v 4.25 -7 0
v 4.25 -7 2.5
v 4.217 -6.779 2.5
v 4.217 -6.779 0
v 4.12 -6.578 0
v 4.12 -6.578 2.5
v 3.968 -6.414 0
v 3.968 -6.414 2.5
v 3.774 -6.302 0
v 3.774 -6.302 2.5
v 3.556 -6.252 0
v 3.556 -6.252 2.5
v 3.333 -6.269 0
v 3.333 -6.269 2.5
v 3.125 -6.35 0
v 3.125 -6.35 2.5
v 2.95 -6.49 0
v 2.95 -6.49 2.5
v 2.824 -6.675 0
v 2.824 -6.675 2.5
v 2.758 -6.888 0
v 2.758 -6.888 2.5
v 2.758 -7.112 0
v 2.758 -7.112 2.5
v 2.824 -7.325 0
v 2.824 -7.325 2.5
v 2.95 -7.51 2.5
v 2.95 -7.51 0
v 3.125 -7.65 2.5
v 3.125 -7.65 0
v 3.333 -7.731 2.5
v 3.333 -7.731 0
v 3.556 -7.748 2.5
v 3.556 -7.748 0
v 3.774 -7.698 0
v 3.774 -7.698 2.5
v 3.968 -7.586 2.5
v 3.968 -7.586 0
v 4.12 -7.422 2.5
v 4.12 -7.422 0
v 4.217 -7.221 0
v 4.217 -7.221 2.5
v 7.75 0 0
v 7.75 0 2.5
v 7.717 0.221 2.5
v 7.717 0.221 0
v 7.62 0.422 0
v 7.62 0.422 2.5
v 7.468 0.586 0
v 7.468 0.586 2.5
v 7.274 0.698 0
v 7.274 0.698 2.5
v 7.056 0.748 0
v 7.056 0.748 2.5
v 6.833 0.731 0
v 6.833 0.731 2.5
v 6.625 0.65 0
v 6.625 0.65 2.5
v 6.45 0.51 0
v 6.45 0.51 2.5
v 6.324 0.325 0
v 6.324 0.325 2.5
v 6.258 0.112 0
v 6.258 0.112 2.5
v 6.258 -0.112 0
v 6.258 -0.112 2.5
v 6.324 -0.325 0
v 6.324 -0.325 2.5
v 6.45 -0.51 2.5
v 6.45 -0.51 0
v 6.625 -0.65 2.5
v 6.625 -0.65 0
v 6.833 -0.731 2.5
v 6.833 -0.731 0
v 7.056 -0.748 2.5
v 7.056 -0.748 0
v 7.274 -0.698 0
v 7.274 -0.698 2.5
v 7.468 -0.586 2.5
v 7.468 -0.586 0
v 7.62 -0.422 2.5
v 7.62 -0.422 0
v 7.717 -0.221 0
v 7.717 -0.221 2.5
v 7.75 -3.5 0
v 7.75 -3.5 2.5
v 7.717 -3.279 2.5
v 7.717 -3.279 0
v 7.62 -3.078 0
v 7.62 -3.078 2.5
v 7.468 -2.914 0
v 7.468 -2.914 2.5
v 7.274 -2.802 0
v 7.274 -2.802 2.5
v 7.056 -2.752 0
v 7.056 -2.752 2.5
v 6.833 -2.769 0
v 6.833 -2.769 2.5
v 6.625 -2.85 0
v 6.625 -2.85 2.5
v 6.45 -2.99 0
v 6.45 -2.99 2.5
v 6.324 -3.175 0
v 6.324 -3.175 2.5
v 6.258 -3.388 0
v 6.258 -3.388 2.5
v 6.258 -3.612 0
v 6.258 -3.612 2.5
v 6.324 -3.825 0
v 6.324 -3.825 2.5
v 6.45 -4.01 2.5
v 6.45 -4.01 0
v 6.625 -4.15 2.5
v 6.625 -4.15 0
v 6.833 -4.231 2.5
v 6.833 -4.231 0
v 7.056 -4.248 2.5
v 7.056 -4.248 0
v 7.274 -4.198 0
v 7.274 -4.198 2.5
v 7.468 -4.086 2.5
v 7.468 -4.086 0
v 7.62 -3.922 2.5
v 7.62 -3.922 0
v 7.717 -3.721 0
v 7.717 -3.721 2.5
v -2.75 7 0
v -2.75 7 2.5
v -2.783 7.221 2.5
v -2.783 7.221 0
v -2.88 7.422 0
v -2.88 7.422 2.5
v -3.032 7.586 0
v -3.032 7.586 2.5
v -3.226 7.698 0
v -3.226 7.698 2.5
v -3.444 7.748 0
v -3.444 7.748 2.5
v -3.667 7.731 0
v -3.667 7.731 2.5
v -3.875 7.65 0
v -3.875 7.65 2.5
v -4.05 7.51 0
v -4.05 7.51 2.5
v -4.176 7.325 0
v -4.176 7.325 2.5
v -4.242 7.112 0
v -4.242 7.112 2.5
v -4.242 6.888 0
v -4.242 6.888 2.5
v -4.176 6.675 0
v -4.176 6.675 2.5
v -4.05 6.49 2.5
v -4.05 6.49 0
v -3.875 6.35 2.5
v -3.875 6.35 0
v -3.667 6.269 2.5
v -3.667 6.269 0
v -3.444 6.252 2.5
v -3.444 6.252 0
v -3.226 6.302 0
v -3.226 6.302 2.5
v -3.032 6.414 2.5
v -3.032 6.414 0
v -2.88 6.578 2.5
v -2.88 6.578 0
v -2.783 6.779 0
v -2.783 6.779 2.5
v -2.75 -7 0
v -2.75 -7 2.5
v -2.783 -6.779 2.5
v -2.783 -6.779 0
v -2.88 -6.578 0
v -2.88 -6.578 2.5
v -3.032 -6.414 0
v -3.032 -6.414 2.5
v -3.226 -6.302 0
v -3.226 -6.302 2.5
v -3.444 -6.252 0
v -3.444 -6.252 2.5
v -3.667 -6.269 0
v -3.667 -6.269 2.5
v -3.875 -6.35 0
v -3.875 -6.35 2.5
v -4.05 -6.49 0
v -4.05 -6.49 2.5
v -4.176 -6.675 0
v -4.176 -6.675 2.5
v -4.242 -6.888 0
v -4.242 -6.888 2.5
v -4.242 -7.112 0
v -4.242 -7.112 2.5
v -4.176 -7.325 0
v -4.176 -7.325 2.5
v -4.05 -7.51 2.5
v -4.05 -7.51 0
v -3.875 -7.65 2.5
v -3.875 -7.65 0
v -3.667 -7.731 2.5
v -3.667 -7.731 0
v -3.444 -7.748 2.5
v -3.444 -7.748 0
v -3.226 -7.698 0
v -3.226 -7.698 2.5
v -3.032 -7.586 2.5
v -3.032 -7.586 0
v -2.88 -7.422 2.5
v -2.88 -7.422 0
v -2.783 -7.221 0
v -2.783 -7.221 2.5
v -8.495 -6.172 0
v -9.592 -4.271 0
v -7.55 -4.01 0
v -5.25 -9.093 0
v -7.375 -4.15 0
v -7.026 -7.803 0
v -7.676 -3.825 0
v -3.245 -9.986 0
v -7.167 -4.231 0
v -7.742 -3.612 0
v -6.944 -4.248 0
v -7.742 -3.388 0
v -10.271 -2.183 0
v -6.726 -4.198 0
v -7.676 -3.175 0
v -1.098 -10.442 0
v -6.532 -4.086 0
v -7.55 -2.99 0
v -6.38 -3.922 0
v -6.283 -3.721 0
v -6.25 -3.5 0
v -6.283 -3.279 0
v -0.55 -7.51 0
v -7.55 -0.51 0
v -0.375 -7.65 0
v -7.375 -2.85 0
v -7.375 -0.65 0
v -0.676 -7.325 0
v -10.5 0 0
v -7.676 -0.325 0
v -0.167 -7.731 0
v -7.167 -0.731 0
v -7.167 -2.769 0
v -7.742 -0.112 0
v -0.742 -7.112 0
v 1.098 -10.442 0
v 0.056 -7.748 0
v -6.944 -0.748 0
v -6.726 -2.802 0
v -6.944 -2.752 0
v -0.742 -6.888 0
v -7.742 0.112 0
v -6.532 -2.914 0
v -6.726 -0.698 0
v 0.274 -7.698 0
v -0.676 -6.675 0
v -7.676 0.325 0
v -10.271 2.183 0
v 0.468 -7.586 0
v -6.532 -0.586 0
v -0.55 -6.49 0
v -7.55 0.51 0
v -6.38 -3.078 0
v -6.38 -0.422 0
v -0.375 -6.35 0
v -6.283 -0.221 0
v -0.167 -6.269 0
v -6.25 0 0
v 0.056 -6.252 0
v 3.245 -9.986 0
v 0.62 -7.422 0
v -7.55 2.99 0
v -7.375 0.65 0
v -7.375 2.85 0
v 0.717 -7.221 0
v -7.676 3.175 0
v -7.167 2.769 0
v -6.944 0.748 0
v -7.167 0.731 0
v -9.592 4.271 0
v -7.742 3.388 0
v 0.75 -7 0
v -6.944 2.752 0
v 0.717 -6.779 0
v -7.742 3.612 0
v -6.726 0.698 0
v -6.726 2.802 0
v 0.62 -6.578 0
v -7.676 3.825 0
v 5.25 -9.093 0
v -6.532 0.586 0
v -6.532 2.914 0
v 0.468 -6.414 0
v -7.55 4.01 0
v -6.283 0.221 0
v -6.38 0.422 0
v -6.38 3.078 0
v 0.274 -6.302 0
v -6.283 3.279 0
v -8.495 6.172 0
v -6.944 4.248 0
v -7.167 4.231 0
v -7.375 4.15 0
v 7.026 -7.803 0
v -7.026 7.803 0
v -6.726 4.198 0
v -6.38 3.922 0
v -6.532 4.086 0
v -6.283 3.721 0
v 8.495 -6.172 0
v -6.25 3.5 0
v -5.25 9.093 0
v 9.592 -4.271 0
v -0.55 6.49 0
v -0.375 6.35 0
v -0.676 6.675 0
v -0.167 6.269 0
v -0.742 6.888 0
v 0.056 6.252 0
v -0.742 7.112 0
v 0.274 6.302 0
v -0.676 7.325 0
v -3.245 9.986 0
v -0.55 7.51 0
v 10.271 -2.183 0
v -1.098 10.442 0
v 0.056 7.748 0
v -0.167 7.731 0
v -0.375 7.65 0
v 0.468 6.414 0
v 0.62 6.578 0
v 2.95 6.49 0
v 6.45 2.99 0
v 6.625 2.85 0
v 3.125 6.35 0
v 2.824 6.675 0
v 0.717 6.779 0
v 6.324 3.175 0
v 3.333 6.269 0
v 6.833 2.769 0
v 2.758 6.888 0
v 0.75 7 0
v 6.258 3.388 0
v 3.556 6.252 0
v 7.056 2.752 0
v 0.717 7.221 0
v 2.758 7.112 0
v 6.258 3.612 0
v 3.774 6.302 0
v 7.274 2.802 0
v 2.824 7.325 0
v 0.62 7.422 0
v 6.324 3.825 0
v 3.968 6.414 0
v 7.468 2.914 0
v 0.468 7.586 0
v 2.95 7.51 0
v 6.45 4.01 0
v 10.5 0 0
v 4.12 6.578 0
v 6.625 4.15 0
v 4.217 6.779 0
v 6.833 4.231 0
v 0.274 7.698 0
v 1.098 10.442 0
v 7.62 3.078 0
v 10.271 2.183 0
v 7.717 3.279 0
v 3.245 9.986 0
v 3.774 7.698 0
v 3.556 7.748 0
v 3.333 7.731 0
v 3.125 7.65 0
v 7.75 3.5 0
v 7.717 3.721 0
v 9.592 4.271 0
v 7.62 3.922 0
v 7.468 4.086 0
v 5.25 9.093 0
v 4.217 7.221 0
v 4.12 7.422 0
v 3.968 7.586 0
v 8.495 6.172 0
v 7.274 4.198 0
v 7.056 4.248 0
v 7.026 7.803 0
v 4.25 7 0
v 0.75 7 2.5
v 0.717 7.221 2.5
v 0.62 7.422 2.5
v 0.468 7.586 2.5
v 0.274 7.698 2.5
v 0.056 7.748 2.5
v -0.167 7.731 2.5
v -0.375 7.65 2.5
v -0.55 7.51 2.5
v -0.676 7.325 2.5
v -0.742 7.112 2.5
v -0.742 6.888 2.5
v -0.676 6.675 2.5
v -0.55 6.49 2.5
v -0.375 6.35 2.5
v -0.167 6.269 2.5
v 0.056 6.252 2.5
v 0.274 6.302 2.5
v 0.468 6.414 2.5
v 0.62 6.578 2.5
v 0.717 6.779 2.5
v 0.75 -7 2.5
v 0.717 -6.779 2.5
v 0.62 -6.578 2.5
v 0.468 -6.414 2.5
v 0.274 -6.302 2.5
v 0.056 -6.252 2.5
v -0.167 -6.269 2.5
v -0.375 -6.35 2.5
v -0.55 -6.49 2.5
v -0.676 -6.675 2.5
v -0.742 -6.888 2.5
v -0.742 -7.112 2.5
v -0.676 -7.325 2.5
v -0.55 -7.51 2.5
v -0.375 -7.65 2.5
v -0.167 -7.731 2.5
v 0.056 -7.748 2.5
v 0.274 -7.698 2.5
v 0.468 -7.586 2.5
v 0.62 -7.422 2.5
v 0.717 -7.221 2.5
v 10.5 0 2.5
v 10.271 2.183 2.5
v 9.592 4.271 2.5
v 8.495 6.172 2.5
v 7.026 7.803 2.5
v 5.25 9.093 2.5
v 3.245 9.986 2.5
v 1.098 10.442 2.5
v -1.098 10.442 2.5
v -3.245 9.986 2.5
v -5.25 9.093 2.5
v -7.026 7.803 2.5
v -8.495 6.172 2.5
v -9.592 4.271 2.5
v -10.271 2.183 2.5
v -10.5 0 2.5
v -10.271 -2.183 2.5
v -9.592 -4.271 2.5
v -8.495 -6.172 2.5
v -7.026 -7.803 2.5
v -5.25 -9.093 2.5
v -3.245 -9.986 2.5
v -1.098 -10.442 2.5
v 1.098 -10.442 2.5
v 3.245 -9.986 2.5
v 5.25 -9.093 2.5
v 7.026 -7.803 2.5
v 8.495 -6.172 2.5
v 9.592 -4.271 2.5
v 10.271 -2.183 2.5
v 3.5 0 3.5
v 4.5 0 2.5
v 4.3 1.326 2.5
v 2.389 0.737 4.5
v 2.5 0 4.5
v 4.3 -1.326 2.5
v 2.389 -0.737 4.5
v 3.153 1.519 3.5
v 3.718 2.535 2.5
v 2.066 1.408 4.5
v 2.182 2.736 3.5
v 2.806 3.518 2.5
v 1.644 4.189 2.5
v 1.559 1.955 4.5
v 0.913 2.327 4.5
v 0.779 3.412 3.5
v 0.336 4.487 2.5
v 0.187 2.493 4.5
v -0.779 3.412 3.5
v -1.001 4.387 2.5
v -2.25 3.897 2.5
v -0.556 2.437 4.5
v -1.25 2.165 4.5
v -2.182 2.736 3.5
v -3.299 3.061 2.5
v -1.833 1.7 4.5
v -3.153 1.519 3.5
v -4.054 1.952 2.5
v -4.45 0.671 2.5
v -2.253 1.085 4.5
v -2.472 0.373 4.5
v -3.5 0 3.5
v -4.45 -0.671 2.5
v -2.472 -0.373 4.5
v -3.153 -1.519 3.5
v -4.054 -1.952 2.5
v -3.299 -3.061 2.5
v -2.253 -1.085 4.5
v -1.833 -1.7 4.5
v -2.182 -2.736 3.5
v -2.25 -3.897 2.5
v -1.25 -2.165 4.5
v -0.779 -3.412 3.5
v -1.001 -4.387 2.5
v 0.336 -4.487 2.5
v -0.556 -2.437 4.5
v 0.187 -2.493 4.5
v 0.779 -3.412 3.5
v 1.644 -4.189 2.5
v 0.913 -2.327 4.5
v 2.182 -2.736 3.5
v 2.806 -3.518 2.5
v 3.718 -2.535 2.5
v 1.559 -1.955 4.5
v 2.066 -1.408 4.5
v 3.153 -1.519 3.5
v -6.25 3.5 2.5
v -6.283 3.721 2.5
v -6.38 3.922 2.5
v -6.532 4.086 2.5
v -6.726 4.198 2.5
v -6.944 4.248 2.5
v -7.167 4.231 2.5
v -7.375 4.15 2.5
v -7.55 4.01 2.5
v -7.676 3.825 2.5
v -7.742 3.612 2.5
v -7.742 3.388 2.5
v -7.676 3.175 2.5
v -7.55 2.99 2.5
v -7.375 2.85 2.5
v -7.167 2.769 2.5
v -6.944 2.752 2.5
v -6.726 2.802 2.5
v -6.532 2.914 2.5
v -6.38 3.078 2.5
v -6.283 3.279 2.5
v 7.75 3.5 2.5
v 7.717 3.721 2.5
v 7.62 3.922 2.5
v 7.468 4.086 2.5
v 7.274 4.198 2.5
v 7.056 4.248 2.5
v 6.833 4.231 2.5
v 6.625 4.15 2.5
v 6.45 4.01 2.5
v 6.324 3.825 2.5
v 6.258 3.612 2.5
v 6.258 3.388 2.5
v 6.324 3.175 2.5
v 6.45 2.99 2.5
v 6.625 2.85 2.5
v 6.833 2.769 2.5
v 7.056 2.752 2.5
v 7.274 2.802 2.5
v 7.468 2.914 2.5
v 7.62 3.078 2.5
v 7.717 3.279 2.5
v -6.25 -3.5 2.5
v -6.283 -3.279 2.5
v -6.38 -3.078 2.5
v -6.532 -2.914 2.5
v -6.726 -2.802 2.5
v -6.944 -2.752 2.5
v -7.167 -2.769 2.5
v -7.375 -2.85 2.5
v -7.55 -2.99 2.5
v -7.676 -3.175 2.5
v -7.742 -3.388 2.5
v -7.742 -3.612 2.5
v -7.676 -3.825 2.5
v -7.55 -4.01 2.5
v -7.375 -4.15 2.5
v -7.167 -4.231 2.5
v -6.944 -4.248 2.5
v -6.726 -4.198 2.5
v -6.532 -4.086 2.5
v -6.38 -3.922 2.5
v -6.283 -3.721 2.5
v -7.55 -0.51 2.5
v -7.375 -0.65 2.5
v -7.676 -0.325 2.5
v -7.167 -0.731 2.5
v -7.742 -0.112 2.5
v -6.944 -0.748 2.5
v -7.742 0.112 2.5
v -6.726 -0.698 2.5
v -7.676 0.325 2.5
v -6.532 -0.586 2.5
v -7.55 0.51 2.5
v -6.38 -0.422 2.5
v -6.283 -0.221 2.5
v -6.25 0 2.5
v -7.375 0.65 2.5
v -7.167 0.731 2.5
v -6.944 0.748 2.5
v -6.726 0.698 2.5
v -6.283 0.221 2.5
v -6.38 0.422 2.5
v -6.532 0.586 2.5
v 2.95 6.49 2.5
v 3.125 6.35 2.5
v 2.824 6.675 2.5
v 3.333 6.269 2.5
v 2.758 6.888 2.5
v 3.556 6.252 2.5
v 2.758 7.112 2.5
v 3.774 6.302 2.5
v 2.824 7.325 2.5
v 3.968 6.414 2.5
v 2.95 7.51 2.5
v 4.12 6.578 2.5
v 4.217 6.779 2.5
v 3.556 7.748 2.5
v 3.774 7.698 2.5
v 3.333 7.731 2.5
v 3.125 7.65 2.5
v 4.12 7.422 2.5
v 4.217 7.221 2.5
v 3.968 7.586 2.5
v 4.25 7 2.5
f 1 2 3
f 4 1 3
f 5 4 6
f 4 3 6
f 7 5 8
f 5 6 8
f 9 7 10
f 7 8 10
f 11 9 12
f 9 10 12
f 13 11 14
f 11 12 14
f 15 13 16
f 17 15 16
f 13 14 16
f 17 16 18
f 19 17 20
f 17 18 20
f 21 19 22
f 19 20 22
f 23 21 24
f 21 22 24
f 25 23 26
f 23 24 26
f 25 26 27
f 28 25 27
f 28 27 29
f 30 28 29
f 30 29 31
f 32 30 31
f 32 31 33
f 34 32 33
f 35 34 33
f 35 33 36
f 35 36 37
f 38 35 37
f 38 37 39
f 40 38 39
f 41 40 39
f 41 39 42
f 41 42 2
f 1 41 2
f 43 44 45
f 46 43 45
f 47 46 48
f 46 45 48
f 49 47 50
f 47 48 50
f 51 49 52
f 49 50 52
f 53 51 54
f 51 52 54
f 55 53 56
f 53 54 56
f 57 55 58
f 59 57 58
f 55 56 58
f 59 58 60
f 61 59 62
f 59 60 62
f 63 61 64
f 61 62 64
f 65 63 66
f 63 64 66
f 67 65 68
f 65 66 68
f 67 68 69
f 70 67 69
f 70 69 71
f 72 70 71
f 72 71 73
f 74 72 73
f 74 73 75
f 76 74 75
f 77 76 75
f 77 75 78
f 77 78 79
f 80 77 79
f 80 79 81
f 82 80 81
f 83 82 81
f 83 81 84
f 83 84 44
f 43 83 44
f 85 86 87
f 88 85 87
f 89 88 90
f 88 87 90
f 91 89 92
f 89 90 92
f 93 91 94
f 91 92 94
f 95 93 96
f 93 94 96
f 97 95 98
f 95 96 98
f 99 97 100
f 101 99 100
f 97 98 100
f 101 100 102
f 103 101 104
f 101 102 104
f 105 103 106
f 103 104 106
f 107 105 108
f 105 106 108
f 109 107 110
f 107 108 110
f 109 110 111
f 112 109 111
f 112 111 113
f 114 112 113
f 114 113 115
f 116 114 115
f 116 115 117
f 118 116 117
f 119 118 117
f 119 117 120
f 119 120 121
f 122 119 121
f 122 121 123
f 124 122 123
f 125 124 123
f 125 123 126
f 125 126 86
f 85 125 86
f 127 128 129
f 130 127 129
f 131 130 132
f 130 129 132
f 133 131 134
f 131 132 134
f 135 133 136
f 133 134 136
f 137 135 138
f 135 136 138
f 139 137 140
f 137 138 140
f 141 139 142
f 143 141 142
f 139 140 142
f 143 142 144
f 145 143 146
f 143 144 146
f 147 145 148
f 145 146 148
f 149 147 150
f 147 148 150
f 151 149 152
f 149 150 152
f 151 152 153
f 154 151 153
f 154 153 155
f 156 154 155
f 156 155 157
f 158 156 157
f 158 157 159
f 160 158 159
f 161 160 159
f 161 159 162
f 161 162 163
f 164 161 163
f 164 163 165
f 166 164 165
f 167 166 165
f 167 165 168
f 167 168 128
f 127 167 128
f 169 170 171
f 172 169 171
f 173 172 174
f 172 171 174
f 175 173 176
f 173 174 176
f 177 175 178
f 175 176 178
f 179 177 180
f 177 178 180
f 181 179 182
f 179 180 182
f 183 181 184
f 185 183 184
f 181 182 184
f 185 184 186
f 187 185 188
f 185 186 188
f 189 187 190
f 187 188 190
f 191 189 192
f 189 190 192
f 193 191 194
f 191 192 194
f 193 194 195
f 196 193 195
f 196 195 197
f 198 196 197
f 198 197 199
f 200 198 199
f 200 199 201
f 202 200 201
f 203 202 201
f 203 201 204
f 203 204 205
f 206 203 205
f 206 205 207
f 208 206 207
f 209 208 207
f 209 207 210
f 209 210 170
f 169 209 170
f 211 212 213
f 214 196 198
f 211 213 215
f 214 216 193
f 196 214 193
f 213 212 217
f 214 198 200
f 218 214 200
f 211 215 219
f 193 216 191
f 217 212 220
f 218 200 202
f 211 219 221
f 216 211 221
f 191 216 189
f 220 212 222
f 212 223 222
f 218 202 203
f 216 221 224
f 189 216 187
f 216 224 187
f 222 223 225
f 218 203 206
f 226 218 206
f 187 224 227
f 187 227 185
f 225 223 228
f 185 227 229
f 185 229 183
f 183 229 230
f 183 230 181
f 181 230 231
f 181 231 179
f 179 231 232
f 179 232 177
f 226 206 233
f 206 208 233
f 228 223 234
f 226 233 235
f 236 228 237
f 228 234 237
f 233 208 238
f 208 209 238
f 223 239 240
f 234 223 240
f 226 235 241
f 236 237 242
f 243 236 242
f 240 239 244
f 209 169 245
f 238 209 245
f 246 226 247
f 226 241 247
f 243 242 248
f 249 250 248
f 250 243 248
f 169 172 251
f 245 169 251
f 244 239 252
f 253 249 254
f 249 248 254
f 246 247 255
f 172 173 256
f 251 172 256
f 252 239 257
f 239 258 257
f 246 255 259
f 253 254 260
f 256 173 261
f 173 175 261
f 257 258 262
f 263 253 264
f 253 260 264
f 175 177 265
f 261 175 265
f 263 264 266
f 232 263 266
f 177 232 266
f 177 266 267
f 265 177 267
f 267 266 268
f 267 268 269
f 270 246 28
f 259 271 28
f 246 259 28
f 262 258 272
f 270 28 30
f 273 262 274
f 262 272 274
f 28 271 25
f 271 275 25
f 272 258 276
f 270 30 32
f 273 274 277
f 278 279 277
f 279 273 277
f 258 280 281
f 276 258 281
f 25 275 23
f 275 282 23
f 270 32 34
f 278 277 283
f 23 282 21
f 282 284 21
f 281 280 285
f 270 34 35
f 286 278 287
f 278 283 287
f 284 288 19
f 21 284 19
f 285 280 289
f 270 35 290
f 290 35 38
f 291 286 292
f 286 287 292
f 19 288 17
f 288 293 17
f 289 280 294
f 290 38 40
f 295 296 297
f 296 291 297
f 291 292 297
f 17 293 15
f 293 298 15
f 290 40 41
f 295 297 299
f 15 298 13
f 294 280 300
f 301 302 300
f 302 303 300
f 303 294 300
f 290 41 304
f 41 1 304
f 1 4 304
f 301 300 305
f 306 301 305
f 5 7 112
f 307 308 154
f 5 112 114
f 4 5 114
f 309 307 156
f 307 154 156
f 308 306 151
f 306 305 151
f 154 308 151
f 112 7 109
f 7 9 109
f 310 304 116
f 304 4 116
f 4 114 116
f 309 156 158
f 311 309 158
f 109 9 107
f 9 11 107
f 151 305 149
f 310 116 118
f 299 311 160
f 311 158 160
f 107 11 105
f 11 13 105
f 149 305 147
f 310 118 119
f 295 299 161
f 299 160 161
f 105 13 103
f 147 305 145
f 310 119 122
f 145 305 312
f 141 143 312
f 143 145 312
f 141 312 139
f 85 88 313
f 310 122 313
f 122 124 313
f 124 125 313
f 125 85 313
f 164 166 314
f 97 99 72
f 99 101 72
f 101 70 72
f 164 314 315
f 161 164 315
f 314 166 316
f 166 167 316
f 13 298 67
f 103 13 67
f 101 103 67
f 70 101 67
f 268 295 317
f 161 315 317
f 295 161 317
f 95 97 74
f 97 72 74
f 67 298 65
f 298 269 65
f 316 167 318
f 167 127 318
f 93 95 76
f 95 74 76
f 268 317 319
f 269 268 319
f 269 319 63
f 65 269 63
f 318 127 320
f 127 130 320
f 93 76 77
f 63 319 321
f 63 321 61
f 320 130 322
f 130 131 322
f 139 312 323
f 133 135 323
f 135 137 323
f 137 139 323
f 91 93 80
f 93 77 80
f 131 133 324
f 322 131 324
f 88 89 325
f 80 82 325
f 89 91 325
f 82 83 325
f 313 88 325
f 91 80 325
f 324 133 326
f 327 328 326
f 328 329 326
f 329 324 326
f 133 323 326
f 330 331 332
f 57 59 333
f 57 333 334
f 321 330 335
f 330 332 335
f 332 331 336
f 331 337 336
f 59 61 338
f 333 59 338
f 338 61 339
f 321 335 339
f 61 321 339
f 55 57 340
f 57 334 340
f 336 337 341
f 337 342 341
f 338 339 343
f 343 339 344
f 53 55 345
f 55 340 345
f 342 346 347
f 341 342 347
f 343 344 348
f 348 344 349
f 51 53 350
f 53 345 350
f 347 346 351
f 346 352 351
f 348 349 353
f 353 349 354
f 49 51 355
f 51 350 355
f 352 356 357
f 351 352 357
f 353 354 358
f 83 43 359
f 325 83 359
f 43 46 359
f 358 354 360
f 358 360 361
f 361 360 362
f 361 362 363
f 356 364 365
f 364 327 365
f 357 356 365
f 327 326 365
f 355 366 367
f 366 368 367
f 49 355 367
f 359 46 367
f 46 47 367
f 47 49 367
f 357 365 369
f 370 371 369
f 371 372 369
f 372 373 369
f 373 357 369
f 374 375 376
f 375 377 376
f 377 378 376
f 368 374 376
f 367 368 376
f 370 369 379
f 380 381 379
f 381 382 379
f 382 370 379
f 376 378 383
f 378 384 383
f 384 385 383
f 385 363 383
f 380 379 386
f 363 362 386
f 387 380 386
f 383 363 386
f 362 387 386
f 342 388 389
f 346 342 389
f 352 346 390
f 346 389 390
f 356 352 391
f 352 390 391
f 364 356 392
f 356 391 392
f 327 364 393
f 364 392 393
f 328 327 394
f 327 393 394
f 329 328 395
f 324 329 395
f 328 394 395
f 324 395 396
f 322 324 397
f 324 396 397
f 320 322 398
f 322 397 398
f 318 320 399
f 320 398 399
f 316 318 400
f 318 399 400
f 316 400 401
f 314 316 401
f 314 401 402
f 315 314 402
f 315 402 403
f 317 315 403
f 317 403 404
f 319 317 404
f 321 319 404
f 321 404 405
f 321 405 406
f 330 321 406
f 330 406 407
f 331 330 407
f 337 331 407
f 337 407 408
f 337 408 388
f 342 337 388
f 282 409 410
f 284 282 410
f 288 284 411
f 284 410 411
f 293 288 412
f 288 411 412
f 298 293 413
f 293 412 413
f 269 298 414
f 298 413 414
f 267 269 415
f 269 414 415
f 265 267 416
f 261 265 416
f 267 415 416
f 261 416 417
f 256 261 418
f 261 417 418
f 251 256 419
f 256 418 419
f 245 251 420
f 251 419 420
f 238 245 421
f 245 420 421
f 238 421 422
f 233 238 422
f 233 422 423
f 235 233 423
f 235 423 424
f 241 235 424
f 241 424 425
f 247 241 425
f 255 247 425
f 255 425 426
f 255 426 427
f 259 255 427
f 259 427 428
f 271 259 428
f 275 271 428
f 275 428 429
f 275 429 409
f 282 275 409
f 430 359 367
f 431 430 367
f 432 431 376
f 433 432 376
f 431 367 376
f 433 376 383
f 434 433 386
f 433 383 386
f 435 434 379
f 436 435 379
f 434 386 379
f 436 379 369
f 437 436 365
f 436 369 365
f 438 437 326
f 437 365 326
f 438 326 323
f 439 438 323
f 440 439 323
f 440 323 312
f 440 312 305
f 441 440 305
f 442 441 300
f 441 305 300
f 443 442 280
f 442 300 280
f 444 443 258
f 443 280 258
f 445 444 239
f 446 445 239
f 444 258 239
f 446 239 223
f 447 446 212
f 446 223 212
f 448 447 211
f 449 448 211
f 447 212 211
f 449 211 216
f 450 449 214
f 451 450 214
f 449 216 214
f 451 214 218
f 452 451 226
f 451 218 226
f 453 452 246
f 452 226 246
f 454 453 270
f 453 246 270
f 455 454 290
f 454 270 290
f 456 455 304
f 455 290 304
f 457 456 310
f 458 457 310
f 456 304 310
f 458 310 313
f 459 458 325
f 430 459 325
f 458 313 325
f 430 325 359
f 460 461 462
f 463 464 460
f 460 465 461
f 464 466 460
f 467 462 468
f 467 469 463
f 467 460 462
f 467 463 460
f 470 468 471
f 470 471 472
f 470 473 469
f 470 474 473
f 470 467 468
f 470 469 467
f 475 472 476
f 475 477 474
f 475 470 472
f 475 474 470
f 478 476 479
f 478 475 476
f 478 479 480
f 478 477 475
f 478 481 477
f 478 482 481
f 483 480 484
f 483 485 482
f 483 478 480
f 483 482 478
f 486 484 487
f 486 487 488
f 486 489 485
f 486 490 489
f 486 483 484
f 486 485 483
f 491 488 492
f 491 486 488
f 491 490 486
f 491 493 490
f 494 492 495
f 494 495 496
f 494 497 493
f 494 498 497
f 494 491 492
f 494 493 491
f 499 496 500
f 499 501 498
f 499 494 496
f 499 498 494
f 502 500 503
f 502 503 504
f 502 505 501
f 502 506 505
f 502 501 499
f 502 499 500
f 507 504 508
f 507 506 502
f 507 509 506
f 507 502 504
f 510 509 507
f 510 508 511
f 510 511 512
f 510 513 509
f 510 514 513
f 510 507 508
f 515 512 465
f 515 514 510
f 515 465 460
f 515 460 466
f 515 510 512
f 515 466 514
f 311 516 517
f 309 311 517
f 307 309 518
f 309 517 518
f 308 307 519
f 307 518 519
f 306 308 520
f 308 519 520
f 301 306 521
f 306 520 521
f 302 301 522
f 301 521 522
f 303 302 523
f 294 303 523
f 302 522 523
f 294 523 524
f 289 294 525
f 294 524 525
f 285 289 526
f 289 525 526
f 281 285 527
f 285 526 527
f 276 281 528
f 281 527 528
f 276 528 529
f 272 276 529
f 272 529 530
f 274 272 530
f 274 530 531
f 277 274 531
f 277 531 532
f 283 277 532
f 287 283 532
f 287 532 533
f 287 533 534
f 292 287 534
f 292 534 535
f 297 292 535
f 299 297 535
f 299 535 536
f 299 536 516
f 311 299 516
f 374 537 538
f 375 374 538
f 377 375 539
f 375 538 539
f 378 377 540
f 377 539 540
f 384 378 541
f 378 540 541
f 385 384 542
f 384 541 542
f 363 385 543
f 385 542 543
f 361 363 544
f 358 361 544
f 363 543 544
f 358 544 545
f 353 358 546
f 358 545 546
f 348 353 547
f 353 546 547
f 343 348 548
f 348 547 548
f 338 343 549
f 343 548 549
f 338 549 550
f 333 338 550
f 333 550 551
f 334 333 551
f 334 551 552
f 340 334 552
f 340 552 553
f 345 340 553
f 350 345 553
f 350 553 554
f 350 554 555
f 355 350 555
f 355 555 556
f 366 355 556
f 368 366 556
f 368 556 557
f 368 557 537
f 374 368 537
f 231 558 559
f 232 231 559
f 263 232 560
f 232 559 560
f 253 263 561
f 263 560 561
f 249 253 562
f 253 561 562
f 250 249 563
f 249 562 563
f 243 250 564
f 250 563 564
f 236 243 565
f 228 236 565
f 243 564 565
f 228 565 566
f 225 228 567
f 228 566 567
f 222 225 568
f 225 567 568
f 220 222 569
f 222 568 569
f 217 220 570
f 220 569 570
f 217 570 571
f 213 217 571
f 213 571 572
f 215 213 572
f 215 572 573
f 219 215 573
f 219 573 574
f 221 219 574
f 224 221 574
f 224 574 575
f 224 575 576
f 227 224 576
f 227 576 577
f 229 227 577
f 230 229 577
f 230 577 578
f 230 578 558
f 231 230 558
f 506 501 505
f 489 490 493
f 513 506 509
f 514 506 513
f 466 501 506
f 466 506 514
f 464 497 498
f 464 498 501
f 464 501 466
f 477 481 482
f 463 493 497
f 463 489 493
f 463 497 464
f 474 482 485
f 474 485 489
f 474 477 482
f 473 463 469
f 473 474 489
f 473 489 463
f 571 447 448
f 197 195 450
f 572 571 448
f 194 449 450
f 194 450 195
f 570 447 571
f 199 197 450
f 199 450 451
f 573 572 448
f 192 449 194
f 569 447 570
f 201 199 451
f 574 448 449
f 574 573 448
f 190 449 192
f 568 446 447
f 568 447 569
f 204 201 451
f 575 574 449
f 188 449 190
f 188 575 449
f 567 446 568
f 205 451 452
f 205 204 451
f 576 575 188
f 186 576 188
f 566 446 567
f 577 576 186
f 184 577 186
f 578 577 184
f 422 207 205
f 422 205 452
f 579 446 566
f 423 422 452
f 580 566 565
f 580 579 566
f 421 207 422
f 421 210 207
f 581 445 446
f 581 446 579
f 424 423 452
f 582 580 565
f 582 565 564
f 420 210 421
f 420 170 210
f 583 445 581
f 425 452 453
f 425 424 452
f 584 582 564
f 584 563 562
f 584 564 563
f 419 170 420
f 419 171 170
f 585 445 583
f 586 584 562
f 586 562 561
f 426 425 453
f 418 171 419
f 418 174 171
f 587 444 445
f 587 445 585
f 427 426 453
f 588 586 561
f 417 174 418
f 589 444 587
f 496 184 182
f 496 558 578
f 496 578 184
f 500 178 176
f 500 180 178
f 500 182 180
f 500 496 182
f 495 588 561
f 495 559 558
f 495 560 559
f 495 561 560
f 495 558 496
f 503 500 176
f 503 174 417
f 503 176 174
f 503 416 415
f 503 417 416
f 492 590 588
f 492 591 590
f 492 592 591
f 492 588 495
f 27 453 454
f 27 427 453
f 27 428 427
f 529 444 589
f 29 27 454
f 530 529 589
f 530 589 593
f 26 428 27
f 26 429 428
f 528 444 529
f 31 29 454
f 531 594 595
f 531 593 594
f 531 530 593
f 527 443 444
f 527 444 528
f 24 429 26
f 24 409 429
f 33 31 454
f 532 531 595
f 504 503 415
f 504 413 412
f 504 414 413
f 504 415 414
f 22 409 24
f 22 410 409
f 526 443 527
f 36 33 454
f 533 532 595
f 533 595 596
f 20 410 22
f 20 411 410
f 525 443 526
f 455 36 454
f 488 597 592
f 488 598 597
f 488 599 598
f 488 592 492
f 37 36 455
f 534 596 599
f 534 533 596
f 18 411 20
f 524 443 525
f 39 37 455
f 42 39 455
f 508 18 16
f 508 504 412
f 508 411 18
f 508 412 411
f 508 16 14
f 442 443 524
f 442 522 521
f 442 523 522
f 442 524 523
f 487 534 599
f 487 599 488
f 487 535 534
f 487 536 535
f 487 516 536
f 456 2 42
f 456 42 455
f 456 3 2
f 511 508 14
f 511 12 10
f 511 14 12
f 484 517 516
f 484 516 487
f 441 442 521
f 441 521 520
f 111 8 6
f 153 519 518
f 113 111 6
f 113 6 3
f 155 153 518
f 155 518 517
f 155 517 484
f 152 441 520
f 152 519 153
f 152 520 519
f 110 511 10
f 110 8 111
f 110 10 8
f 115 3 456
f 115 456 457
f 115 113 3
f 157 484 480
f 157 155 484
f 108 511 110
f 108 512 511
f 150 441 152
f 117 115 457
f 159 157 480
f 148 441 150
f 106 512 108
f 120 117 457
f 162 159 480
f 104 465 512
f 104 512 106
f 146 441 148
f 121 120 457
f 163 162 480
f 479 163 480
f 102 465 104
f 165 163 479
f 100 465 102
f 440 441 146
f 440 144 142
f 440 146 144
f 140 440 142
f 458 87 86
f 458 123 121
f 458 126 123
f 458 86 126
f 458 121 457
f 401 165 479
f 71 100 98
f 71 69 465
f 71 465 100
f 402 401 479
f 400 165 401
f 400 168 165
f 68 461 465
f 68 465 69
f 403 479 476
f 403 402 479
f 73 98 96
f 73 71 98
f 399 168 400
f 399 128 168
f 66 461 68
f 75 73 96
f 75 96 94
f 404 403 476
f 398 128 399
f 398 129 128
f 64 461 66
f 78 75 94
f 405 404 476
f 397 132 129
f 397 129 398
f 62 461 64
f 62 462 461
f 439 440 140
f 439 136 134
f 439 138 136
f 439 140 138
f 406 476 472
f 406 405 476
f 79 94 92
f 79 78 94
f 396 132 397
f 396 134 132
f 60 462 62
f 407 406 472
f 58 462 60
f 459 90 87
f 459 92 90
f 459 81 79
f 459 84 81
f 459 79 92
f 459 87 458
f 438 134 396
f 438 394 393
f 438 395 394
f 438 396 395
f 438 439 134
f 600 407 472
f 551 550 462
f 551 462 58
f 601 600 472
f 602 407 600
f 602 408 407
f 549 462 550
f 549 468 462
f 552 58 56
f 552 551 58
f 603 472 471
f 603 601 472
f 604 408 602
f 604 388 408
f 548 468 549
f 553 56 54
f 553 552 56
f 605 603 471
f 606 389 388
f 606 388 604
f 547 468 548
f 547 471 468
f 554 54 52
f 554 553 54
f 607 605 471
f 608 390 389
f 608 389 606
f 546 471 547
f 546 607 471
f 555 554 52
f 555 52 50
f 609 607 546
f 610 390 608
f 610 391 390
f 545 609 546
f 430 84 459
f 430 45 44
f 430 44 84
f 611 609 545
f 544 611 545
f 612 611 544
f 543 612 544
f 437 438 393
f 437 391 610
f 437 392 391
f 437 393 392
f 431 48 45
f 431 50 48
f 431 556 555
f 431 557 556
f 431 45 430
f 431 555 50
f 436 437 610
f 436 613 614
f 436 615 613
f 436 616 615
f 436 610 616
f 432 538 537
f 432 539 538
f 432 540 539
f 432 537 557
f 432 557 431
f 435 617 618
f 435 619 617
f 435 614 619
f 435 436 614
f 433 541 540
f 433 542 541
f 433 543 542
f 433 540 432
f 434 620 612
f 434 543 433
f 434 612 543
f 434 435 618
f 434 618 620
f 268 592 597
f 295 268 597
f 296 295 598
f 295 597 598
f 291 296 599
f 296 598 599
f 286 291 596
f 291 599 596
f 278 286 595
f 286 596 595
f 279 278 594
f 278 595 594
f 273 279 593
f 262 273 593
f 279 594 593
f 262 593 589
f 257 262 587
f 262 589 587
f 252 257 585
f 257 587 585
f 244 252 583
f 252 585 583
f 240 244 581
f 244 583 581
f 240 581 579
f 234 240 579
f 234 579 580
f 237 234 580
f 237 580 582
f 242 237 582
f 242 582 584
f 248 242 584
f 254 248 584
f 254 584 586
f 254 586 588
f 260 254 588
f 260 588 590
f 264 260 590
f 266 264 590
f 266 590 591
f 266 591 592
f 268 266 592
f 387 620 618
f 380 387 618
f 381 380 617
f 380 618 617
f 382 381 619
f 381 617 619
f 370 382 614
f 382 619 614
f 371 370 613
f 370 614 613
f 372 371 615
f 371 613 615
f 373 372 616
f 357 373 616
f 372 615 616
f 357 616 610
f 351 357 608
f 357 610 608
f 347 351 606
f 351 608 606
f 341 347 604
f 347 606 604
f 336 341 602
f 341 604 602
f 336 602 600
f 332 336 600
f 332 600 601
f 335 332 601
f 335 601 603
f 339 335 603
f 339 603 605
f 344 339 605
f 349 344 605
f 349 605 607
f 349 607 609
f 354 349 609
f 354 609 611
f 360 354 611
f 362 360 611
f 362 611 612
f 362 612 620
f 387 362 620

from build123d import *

# Parameters (mm, degrees)
SKETCH1_R           = 10.5
BOSS_EXTRUDE1_DEPTH = 2.5
SKETCH3_R           = 4.5
BOSS_EXTRUDE2_DEPTH = 2
CHAMFER1_SIZE       = 2
SKETCH4_R           = 0.75
CUT_EXTRUDE1_DEPTH  = 16.058220346


with BuildPart() as part:
    # Sketch1 → Boss-Extrude1 (new body)
    with BuildSketch(Plane.XY):
        Circle(SKETCH1_R)
    extrude(amount=BOSS_EXTRUDE1_DEPTH)

    # Sketch3 → Boss-Extrude2 (add)
    with BuildSketch(Plane.XY.offset(2.5)):
        Circle(SKETCH3_R)
    extrude(amount=BOSS_EXTRUDE2_DEPTH)

    # Chamfer1
    chamfer1_edges = [part.edges().sort_by_distance(p)[0] for p in [
        (-4.5, 0, 4.5),
    ]]
    chamfer(chamfer1_edges, length=CHAMFER1_SIZE - 0.0001)  # a hair under: the kernel refuses the full size

    # Sketch4 → Cut-Extrude1 (cut, through all)
    with BuildSketch(Plane.XY.offset(2.5)):
        with Locations((0, 7)):
            Circle(SKETCH4_R)
        with Locations((7, 0)):
            Circle(SKETCH4_R)
        with Locations((0, -7)):
            Circle(SKETCH4_R)
        with Locations((-7, 0)):
            Circle(SKETCH4_R)
        with Locations((3.5, 7)):
            Circle(SKETCH4_R)
        with Locations((-3.5, 7)):
            Circle(SKETCH4_R)
        with Locations((7, -3.5)):
            Circle(SKETCH4_R)
        with Locations((7, 3.5)):
            Circle(SKETCH4_R)
        with Locations((3.5, -7)):
            Circle(SKETCH4_R)
        with Locations((-3.5, -7)):
            Circle(SKETCH4_R)
        with Locations((-7, -3.5)):
            Circle(SKETCH4_R)
        with Locations((-7, 3.5)):
            Circle(SKETCH4_R)
    extrude(amount=-CUT_EXTRUDE1_DEPTH, mode=Mode.SUBTRACT)


solid = part.part
